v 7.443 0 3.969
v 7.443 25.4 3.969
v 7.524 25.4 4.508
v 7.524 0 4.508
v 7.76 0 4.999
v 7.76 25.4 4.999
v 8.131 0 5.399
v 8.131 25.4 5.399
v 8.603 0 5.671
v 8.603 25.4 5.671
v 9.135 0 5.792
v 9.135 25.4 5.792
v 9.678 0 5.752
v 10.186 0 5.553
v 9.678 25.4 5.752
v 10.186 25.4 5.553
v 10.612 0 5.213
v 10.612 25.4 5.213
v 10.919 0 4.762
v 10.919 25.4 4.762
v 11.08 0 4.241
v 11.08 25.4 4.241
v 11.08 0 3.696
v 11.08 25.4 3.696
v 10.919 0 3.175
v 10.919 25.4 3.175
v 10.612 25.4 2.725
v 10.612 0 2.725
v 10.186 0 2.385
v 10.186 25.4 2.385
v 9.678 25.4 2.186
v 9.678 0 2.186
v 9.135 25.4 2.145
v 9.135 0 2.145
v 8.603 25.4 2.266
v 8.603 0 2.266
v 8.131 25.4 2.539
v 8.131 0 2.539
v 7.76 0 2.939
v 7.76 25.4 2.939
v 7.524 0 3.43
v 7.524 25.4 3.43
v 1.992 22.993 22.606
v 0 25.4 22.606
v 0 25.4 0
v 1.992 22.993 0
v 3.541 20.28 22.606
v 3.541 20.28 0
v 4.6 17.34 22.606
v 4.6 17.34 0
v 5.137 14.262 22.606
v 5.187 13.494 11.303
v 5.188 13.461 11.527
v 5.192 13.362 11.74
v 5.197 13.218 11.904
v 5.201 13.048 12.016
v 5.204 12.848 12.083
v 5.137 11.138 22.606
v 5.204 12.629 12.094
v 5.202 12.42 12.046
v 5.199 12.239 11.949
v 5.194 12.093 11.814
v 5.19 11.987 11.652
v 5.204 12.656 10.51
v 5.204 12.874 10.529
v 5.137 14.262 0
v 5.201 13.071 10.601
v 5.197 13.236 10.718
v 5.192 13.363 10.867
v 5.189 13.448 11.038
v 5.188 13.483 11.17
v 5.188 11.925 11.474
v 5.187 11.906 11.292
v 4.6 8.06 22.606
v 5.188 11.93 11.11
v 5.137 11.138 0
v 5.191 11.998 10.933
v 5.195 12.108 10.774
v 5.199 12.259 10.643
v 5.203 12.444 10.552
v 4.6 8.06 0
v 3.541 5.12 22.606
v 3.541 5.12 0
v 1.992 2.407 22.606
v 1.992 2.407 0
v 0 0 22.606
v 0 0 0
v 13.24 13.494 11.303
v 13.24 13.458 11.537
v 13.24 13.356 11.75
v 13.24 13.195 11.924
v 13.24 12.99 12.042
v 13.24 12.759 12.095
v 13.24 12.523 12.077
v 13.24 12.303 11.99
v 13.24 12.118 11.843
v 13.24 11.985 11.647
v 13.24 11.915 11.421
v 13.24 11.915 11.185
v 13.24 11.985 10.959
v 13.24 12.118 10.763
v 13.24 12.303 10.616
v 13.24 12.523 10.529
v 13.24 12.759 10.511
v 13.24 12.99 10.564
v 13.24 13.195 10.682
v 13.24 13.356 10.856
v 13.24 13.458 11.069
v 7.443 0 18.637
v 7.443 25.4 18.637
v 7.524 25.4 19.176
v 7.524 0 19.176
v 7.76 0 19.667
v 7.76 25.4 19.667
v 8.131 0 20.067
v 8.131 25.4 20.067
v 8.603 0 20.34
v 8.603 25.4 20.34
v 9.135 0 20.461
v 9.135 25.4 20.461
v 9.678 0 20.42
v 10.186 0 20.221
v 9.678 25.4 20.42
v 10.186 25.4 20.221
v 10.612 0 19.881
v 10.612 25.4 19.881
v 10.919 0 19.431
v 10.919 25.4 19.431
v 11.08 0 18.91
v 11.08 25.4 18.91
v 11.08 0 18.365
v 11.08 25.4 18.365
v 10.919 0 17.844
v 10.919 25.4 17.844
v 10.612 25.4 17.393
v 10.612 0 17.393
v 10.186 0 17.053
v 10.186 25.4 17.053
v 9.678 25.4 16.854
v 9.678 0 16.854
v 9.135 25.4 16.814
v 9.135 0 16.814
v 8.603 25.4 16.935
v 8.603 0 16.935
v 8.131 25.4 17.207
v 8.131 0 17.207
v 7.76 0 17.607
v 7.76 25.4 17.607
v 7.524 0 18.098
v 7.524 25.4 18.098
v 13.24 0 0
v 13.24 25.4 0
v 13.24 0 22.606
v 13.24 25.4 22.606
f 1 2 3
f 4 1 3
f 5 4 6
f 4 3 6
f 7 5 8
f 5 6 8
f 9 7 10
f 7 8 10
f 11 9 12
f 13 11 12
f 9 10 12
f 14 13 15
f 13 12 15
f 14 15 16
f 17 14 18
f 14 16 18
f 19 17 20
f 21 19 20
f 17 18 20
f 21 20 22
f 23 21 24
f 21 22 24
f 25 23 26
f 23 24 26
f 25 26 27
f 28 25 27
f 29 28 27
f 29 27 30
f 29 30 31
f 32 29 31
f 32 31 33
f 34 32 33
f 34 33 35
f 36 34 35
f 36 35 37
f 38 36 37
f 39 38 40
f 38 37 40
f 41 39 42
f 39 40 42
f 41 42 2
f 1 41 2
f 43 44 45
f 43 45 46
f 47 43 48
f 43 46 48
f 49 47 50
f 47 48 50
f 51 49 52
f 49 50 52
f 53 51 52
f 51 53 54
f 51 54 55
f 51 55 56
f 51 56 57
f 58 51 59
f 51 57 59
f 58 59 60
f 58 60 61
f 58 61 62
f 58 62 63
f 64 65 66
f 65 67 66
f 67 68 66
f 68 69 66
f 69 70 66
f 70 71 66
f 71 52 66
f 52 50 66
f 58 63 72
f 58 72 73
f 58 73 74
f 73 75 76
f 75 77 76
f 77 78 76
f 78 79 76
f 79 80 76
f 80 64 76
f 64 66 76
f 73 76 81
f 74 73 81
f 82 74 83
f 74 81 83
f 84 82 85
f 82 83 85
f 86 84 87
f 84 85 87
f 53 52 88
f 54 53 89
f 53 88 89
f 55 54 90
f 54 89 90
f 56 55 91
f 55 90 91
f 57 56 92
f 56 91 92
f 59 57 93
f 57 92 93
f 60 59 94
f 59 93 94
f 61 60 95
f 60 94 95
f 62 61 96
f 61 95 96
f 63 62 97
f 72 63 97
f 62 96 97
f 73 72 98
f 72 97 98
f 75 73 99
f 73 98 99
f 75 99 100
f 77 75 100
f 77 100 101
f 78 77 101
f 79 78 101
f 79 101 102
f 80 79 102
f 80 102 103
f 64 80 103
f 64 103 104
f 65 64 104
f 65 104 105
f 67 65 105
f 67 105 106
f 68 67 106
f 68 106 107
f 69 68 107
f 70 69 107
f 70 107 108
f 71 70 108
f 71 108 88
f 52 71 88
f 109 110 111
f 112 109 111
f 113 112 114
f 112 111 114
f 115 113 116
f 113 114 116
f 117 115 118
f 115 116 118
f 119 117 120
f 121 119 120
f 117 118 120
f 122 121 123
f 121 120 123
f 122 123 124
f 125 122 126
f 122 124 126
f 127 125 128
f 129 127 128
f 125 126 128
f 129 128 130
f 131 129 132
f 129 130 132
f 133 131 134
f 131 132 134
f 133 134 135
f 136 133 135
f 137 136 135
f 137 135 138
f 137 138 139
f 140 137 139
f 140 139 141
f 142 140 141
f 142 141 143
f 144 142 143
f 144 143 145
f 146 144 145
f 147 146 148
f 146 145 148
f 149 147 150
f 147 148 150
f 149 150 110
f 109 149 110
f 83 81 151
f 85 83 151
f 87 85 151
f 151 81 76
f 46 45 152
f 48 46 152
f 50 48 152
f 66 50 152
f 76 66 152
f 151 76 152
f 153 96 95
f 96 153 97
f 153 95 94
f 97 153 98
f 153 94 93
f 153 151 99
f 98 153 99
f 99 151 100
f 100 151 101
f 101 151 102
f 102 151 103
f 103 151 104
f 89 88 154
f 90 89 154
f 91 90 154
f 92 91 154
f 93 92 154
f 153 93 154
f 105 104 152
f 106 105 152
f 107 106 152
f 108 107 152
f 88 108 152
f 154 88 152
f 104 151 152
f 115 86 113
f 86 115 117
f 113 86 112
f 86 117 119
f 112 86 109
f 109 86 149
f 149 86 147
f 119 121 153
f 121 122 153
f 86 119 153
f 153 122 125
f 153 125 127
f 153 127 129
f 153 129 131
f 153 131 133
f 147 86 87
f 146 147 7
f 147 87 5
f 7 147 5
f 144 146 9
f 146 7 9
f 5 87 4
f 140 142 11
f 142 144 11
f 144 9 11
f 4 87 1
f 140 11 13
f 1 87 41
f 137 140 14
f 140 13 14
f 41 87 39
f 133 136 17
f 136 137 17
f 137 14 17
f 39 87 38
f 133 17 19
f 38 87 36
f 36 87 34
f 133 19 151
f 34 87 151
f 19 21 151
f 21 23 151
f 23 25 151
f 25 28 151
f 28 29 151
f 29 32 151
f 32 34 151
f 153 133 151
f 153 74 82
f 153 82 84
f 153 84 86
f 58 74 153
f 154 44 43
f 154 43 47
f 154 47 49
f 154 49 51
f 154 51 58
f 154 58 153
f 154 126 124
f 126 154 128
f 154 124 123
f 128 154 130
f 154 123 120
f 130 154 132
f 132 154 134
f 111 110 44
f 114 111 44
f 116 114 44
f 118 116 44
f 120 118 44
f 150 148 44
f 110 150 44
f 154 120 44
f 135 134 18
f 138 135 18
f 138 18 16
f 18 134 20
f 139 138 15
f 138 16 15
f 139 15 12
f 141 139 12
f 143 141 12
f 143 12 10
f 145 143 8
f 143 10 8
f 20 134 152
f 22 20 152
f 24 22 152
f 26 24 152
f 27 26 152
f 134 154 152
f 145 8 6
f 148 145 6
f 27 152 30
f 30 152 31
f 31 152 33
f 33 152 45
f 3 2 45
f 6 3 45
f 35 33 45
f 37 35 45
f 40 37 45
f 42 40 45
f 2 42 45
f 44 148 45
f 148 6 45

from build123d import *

# Parameters (mm, degrees)
F1_DEPTH = 22.606
F2_R     = 1.8288
F3_DEPTH = 25.4
F4_R     = 0.79375
F5_DEPTH = 9.0530042065


with BuildPart() as f1:
    # F0 (on Top) → F1 (new body)
    with BuildSketch(Plane.XY):
        with BuildLine():
            ThreePointArc((0, 25.4), (5.2044977798, 12.7), (0, 0))
            Line((0, 0), (13.2400867088, 0))
            Line((13.2400867088, 0), (13.2400867088, 25.4))
            Line((13.2400867088, 25.4), (0, 25.4))
        make_face()
    extrude(amount=F1_DEPTH)

    # F2 (on face) → F3 (cut, through all)
    with BuildSketch(Plane(origin=(0, 25.4, 0), x_dir=(-1, 0, 0), z_dir=(0, 1, 0))):
        with Locations((-9.2713367088, 3.96875)):
            Circle(F2_R)
        with Locations((-9.2713367088, 18.63725)):
            Circle(F2_R)
    extrude(amount=-F3_DEPTH, mode=Mode.SUBTRACT)

    # F4 (on face) → F5 (cut, up to face)
    with BuildSketch(Plane.YZ.offset(13.2400867088)):
        with Locations((12.7, 11.303)):
            Circle(F4_R)
    extrude(amount=-F5_DEPTH, mode=Mode.SUBTRACT)


solid = f1.part
